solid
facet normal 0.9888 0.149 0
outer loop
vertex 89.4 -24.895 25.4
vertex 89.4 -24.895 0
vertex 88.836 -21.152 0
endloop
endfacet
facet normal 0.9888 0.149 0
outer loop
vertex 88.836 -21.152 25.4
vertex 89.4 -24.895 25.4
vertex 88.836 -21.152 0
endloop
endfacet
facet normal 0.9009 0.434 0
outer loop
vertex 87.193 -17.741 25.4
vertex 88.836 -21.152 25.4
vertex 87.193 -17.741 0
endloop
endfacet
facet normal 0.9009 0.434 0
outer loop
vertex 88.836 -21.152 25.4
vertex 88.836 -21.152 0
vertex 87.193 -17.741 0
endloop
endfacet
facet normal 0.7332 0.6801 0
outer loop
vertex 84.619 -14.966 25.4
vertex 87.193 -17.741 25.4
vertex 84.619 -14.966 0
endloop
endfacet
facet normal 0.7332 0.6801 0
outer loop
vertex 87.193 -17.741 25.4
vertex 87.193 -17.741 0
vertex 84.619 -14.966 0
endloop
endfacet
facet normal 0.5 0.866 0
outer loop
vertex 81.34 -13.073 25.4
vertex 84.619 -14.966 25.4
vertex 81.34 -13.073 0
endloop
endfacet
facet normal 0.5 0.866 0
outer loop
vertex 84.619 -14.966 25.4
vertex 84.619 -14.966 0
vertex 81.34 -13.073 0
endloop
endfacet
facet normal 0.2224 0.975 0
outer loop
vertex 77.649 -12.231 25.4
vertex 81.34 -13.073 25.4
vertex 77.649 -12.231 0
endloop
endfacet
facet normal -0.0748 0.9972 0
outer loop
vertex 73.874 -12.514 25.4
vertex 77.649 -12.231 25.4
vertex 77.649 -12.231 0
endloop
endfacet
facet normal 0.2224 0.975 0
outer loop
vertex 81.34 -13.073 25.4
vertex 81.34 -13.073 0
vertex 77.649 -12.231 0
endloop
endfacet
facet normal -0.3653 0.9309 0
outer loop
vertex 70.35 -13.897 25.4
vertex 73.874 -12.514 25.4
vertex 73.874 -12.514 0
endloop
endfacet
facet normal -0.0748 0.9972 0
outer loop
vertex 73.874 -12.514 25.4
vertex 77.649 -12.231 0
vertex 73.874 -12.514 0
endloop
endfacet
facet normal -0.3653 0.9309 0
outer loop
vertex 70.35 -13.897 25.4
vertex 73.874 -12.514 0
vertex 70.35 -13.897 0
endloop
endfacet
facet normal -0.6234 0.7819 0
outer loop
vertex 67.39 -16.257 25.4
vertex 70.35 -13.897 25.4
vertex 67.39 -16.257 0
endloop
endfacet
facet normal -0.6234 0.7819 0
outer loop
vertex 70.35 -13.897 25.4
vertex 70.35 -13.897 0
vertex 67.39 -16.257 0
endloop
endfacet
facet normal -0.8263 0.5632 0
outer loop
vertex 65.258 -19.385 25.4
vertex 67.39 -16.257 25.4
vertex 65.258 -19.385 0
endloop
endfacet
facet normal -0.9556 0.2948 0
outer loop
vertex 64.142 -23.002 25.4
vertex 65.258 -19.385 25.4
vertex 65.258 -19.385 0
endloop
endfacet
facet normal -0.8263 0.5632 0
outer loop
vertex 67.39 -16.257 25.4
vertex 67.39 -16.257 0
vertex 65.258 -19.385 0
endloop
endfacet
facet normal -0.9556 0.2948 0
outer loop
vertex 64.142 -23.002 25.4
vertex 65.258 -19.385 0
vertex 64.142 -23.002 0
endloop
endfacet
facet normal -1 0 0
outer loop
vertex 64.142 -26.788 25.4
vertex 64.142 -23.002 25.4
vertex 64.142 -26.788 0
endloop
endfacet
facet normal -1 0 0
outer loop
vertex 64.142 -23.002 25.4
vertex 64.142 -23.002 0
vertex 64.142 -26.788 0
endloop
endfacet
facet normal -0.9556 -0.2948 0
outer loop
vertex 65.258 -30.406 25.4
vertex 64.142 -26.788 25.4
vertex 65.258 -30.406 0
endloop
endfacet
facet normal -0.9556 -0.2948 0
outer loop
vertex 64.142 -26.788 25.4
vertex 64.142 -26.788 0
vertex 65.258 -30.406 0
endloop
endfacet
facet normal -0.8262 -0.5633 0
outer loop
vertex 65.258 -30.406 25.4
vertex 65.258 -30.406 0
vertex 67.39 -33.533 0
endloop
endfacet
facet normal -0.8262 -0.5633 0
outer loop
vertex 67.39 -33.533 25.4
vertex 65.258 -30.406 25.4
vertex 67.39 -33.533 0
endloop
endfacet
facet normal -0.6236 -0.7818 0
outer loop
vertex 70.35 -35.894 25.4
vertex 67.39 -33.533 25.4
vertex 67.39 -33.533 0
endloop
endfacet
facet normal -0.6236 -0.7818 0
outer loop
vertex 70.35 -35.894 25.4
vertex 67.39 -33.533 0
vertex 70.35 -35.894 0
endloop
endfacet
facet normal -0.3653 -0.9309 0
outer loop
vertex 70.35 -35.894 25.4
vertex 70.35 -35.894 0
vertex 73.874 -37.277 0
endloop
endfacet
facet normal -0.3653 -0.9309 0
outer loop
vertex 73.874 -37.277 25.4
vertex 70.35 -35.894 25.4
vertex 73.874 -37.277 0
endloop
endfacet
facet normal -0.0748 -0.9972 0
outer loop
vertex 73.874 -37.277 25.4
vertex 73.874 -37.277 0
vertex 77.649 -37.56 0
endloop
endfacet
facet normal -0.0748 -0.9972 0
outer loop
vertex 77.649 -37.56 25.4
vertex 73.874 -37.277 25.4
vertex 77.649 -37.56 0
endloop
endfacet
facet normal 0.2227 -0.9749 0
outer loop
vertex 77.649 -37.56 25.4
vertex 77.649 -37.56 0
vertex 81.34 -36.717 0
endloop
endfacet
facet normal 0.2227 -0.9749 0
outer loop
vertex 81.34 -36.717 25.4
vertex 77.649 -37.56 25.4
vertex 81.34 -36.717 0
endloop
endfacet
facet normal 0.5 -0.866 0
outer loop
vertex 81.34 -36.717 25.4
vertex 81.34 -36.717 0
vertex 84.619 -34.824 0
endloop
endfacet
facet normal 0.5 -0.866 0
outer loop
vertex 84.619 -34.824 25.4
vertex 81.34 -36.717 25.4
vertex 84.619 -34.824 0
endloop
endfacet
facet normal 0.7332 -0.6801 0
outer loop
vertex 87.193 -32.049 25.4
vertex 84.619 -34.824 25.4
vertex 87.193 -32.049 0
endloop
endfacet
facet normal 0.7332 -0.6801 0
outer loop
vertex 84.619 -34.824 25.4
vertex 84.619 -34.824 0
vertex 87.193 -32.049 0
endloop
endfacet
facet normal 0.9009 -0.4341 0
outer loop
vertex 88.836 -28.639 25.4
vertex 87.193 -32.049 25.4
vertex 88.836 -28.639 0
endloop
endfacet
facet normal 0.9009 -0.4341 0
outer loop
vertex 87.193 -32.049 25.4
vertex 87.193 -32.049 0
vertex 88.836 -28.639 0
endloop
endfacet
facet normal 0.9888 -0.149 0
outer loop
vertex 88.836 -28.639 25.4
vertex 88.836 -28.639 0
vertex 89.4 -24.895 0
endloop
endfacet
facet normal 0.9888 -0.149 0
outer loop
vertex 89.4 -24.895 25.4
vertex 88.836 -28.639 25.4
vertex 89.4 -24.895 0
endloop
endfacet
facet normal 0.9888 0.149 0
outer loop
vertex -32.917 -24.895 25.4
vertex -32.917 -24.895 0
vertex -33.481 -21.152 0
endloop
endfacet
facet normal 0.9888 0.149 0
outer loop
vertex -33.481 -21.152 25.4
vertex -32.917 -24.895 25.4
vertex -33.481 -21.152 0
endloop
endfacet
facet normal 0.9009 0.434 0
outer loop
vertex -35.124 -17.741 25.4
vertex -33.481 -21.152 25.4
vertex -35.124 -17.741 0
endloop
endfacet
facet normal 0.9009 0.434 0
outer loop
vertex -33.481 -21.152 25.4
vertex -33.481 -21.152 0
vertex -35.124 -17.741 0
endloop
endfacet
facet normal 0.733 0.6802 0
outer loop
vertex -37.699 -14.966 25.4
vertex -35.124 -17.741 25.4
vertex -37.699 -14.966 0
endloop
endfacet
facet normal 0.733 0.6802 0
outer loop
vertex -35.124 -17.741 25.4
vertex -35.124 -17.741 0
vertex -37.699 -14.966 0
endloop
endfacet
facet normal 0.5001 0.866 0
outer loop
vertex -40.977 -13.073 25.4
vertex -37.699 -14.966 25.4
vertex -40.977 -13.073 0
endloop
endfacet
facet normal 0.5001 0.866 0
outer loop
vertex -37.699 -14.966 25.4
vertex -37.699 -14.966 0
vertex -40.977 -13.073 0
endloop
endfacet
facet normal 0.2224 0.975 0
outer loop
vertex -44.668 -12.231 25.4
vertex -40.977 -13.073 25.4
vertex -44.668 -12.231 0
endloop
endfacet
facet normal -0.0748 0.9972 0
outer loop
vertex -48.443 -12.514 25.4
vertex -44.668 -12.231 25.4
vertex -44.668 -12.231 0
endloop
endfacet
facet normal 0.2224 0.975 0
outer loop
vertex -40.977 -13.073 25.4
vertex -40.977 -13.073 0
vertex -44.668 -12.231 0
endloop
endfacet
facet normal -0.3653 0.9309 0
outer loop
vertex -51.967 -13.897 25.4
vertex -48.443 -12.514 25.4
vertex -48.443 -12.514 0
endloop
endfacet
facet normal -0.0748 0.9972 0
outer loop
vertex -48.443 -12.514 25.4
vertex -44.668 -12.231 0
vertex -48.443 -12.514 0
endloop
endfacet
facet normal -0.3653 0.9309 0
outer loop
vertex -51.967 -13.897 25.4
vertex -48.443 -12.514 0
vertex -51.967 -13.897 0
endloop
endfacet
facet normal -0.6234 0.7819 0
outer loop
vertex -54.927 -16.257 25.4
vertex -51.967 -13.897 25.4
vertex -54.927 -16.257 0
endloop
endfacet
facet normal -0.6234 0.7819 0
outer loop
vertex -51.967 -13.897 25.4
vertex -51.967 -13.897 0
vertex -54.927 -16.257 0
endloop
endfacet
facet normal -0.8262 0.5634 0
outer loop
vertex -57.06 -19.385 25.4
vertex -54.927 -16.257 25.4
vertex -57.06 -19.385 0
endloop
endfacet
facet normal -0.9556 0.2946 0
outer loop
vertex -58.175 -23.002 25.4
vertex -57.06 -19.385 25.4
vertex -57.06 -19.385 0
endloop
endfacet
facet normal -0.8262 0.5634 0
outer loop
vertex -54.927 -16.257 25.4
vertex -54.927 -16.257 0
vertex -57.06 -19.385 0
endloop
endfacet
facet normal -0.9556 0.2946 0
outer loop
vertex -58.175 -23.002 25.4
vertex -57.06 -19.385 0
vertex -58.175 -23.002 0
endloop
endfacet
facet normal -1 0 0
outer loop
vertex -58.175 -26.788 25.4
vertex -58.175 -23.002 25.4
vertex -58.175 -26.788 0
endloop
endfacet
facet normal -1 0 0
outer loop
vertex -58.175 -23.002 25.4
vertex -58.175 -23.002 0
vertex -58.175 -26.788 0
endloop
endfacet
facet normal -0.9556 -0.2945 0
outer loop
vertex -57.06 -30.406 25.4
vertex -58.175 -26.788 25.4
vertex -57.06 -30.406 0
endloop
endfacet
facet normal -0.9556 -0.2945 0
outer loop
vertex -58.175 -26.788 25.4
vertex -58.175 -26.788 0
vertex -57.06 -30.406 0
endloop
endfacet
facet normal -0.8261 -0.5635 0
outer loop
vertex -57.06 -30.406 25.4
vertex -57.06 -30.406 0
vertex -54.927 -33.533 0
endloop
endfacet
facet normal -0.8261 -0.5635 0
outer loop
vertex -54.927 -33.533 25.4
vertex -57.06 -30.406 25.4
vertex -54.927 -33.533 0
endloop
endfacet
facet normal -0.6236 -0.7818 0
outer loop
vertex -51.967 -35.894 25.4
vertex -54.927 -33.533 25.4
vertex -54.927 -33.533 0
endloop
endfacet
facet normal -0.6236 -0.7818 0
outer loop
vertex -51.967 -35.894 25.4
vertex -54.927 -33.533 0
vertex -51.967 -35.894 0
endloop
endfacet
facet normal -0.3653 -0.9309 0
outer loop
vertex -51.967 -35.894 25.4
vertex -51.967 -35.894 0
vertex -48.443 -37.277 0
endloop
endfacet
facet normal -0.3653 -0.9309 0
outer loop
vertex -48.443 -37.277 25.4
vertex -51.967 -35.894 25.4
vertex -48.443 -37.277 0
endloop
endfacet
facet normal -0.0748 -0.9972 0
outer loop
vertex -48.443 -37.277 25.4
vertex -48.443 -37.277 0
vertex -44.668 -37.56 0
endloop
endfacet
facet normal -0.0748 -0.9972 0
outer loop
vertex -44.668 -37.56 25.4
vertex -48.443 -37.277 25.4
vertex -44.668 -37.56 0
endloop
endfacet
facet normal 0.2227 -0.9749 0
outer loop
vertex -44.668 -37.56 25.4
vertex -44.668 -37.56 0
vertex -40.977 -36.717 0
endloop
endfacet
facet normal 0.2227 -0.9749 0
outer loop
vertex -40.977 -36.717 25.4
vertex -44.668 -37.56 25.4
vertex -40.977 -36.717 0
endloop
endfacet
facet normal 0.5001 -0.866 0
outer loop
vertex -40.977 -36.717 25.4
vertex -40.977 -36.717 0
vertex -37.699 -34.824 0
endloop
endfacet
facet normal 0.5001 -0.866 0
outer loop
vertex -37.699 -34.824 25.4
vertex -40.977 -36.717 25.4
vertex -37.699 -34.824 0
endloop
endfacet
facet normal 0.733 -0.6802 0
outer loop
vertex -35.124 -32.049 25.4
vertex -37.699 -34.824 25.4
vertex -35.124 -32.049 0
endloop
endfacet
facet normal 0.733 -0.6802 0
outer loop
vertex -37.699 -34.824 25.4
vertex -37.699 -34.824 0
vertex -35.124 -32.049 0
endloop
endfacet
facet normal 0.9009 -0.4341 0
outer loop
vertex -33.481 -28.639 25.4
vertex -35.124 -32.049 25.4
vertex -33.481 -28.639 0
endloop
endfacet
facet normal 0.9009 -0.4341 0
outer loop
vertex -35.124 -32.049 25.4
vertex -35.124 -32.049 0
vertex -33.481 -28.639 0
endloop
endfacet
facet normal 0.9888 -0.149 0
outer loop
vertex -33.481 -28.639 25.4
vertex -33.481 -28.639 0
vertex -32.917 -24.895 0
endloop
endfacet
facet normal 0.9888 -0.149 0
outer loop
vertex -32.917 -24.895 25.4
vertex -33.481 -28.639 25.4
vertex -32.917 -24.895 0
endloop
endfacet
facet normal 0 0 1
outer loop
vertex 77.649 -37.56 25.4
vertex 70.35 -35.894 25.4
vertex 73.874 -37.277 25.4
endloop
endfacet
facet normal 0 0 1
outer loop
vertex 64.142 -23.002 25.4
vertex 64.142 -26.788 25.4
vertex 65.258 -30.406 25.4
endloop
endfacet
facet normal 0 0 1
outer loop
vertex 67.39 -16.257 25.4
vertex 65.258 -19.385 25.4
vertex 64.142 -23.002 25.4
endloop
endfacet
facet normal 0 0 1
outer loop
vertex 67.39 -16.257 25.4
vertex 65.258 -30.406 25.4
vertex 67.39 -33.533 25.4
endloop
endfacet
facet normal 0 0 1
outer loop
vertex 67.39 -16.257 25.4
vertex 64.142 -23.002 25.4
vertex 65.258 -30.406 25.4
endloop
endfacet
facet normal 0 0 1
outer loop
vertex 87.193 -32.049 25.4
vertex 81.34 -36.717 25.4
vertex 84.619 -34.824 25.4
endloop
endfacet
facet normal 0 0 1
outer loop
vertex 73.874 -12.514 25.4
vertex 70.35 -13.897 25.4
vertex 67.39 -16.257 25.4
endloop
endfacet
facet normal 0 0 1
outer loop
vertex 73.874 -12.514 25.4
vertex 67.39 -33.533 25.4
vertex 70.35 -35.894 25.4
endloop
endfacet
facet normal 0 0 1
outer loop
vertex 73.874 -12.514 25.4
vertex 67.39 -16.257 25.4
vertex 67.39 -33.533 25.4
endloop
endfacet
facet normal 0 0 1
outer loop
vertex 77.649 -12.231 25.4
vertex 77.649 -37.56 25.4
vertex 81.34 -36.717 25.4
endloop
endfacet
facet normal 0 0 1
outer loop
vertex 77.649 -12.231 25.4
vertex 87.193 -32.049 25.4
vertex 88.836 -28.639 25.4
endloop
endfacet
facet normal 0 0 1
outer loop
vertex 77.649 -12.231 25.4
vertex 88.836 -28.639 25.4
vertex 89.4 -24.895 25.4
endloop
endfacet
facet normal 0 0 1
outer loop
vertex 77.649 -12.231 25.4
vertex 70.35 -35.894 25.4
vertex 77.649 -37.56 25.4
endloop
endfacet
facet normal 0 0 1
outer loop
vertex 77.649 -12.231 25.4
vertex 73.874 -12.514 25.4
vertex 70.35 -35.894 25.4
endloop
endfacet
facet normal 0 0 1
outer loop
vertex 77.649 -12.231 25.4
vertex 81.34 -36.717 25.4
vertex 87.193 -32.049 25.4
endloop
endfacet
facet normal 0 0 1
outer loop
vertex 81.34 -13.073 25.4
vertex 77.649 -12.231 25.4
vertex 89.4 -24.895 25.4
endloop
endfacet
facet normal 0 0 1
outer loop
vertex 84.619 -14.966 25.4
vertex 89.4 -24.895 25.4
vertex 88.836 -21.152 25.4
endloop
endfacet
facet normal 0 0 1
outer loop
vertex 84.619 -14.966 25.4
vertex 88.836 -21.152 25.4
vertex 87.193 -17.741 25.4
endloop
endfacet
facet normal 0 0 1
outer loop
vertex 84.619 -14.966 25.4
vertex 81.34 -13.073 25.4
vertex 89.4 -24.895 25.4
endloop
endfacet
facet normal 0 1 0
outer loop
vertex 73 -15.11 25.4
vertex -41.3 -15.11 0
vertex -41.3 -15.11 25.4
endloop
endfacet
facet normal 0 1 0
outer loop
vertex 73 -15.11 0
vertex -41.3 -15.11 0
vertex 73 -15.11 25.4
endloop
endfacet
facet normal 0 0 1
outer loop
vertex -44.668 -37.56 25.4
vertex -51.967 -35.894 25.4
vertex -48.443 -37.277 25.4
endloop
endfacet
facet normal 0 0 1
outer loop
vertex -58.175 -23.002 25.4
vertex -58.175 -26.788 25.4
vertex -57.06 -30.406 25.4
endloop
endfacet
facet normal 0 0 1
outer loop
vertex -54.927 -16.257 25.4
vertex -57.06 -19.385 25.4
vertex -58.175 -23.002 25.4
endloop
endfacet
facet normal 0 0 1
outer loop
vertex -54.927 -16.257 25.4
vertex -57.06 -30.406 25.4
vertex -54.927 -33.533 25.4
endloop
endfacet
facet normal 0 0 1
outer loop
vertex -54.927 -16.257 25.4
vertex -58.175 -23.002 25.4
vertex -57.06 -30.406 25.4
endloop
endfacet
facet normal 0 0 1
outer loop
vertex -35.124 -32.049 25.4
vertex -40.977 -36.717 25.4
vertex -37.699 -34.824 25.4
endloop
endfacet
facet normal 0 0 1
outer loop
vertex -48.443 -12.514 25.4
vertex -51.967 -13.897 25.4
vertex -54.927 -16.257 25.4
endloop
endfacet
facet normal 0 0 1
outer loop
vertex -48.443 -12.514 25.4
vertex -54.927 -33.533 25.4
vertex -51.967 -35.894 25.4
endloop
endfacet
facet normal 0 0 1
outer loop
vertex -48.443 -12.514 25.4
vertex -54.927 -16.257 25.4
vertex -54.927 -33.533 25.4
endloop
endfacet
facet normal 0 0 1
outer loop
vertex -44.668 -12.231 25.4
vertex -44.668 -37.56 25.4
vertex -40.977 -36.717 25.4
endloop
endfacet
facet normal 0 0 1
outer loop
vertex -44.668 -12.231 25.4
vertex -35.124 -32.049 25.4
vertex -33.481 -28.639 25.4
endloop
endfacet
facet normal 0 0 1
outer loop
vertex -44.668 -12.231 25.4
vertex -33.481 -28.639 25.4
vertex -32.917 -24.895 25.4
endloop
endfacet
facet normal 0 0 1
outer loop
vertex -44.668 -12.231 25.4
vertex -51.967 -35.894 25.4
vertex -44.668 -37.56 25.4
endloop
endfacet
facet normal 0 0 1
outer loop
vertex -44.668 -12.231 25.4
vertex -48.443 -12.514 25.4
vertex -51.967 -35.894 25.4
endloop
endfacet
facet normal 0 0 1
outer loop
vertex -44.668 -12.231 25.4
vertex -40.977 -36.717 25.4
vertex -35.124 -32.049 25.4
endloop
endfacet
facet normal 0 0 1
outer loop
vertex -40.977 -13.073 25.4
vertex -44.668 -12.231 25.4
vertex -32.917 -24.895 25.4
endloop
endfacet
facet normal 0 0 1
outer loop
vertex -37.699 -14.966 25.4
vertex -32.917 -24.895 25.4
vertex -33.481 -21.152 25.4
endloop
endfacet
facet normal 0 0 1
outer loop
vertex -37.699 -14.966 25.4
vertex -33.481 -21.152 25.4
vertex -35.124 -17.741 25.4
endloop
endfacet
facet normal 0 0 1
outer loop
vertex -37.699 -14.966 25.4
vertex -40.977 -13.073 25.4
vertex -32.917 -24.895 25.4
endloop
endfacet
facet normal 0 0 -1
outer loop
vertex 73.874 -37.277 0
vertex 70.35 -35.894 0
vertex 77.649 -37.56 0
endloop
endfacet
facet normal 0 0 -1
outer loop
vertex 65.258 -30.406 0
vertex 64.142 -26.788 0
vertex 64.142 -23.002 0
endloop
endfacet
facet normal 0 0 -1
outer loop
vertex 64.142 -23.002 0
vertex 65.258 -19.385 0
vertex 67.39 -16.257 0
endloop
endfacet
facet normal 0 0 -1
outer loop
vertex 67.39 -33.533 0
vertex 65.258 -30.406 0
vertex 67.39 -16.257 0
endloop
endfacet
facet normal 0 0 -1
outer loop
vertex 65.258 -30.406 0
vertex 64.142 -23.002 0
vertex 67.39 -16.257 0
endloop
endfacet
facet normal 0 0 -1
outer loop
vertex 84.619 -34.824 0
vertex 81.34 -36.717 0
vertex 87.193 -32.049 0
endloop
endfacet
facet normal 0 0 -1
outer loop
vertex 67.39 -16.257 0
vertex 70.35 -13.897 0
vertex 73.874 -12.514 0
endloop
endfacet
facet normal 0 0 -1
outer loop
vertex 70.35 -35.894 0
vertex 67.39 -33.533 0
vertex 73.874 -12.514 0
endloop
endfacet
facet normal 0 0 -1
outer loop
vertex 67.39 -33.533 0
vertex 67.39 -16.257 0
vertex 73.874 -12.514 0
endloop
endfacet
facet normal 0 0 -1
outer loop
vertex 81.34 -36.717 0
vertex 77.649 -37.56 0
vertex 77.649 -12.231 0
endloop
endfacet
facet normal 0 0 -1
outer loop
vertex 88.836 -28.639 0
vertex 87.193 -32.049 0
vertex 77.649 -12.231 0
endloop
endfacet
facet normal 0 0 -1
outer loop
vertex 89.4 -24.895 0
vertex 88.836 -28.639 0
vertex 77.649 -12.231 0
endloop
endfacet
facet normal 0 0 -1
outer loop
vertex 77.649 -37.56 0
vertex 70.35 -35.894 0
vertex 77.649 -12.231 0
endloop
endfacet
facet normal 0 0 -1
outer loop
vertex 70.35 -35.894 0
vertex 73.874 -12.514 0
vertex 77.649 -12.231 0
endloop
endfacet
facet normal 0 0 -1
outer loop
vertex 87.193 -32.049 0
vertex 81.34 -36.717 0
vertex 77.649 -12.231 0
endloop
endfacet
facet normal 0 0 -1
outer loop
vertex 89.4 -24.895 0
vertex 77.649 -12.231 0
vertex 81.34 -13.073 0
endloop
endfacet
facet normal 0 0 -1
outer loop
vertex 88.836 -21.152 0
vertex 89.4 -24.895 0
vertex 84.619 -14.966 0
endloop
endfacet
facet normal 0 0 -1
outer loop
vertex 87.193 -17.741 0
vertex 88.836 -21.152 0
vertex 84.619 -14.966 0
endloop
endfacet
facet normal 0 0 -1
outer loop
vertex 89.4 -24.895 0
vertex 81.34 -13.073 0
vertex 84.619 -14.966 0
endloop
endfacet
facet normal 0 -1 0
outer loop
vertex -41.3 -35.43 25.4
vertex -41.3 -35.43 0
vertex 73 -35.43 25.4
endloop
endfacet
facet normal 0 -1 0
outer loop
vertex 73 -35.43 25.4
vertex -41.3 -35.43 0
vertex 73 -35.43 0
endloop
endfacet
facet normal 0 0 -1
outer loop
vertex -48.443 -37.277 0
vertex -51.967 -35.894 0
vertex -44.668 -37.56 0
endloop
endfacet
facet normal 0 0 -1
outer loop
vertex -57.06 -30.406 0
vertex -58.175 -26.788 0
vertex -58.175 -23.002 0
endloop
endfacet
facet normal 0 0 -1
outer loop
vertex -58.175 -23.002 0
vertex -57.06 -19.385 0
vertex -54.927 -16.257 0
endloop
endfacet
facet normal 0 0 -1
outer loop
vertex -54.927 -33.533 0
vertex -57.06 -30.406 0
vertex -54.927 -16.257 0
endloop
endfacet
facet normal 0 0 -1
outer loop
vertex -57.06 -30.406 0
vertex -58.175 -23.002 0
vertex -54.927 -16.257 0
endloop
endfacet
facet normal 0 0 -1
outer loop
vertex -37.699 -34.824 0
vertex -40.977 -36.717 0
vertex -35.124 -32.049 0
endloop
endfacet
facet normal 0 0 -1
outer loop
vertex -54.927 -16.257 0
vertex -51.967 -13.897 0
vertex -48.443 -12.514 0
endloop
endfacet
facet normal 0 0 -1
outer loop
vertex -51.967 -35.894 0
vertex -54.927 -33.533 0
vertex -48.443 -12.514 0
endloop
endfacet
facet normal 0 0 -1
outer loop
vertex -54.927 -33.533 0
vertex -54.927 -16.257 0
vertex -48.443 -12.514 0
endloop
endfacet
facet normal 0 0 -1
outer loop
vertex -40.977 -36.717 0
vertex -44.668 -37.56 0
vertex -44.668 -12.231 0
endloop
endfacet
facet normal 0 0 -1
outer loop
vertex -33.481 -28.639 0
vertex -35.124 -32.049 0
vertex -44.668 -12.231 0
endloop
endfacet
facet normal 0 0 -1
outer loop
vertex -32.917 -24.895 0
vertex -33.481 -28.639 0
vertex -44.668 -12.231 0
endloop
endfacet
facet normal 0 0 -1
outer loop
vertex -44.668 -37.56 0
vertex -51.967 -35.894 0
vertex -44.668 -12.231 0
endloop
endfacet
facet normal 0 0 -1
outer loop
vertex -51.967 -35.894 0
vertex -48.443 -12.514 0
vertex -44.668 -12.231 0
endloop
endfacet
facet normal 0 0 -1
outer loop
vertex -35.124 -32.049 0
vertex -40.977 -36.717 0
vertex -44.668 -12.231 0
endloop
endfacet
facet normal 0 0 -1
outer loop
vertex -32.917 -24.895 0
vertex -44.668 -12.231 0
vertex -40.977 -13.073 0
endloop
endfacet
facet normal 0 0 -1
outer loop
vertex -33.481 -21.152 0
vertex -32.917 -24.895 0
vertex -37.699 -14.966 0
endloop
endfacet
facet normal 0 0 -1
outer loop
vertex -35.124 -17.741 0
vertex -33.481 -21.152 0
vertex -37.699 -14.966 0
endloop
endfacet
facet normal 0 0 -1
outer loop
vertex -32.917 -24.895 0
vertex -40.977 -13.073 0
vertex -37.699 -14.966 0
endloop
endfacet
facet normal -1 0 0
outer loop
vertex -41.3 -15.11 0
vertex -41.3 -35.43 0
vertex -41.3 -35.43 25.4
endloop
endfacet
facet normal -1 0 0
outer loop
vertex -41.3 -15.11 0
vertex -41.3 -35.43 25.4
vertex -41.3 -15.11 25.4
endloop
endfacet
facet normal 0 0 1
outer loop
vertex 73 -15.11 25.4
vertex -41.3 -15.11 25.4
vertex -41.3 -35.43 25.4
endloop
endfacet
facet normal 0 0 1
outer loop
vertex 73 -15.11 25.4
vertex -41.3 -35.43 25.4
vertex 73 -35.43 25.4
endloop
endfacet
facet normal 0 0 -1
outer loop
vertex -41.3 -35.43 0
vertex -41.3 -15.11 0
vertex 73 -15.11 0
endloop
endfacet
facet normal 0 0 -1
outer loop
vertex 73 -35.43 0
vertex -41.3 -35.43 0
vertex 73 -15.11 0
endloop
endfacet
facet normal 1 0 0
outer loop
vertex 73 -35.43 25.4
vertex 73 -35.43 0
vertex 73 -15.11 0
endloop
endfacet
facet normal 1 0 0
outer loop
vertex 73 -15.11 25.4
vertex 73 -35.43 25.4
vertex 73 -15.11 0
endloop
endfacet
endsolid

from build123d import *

# Parameters (mm, degrees)
F1_R     = 12.7
F2_DEPTH = 25.4
F0_W     = 114.3
F0_H     = 20.32


with BuildPart() as f2:
    # F1 (on Top) → F2 (new body)
    with BuildSketch(Plane.XY):
        with Locations((-45.6172116101, -24.8951986432)):
            Circle(F1_R)
    extrude(amount=F2_DEPTH)


with BuildPart() as f2b:
    # F1 (on Top) → F2, piece 2 (new body)
    with BuildSketch(Plane.XY):
        with Locations((76.700232923, -24.8951986432)):
            Circle(F1_R)
    extrude(amount=F2_DEPTH)


with BuildPart() as f2c:
    # F0 (on Top) → F2, piece 3 (new body)
    with BuildSketch(Plane.XY):
        with Locations((15.8498745799, -25.2698025963)):
            Rectangle(F0_W, F0_H)
    extrude(amount=F2_DEPTH)


solid = Compound([f2.part, f2b.part, f2c.part])
